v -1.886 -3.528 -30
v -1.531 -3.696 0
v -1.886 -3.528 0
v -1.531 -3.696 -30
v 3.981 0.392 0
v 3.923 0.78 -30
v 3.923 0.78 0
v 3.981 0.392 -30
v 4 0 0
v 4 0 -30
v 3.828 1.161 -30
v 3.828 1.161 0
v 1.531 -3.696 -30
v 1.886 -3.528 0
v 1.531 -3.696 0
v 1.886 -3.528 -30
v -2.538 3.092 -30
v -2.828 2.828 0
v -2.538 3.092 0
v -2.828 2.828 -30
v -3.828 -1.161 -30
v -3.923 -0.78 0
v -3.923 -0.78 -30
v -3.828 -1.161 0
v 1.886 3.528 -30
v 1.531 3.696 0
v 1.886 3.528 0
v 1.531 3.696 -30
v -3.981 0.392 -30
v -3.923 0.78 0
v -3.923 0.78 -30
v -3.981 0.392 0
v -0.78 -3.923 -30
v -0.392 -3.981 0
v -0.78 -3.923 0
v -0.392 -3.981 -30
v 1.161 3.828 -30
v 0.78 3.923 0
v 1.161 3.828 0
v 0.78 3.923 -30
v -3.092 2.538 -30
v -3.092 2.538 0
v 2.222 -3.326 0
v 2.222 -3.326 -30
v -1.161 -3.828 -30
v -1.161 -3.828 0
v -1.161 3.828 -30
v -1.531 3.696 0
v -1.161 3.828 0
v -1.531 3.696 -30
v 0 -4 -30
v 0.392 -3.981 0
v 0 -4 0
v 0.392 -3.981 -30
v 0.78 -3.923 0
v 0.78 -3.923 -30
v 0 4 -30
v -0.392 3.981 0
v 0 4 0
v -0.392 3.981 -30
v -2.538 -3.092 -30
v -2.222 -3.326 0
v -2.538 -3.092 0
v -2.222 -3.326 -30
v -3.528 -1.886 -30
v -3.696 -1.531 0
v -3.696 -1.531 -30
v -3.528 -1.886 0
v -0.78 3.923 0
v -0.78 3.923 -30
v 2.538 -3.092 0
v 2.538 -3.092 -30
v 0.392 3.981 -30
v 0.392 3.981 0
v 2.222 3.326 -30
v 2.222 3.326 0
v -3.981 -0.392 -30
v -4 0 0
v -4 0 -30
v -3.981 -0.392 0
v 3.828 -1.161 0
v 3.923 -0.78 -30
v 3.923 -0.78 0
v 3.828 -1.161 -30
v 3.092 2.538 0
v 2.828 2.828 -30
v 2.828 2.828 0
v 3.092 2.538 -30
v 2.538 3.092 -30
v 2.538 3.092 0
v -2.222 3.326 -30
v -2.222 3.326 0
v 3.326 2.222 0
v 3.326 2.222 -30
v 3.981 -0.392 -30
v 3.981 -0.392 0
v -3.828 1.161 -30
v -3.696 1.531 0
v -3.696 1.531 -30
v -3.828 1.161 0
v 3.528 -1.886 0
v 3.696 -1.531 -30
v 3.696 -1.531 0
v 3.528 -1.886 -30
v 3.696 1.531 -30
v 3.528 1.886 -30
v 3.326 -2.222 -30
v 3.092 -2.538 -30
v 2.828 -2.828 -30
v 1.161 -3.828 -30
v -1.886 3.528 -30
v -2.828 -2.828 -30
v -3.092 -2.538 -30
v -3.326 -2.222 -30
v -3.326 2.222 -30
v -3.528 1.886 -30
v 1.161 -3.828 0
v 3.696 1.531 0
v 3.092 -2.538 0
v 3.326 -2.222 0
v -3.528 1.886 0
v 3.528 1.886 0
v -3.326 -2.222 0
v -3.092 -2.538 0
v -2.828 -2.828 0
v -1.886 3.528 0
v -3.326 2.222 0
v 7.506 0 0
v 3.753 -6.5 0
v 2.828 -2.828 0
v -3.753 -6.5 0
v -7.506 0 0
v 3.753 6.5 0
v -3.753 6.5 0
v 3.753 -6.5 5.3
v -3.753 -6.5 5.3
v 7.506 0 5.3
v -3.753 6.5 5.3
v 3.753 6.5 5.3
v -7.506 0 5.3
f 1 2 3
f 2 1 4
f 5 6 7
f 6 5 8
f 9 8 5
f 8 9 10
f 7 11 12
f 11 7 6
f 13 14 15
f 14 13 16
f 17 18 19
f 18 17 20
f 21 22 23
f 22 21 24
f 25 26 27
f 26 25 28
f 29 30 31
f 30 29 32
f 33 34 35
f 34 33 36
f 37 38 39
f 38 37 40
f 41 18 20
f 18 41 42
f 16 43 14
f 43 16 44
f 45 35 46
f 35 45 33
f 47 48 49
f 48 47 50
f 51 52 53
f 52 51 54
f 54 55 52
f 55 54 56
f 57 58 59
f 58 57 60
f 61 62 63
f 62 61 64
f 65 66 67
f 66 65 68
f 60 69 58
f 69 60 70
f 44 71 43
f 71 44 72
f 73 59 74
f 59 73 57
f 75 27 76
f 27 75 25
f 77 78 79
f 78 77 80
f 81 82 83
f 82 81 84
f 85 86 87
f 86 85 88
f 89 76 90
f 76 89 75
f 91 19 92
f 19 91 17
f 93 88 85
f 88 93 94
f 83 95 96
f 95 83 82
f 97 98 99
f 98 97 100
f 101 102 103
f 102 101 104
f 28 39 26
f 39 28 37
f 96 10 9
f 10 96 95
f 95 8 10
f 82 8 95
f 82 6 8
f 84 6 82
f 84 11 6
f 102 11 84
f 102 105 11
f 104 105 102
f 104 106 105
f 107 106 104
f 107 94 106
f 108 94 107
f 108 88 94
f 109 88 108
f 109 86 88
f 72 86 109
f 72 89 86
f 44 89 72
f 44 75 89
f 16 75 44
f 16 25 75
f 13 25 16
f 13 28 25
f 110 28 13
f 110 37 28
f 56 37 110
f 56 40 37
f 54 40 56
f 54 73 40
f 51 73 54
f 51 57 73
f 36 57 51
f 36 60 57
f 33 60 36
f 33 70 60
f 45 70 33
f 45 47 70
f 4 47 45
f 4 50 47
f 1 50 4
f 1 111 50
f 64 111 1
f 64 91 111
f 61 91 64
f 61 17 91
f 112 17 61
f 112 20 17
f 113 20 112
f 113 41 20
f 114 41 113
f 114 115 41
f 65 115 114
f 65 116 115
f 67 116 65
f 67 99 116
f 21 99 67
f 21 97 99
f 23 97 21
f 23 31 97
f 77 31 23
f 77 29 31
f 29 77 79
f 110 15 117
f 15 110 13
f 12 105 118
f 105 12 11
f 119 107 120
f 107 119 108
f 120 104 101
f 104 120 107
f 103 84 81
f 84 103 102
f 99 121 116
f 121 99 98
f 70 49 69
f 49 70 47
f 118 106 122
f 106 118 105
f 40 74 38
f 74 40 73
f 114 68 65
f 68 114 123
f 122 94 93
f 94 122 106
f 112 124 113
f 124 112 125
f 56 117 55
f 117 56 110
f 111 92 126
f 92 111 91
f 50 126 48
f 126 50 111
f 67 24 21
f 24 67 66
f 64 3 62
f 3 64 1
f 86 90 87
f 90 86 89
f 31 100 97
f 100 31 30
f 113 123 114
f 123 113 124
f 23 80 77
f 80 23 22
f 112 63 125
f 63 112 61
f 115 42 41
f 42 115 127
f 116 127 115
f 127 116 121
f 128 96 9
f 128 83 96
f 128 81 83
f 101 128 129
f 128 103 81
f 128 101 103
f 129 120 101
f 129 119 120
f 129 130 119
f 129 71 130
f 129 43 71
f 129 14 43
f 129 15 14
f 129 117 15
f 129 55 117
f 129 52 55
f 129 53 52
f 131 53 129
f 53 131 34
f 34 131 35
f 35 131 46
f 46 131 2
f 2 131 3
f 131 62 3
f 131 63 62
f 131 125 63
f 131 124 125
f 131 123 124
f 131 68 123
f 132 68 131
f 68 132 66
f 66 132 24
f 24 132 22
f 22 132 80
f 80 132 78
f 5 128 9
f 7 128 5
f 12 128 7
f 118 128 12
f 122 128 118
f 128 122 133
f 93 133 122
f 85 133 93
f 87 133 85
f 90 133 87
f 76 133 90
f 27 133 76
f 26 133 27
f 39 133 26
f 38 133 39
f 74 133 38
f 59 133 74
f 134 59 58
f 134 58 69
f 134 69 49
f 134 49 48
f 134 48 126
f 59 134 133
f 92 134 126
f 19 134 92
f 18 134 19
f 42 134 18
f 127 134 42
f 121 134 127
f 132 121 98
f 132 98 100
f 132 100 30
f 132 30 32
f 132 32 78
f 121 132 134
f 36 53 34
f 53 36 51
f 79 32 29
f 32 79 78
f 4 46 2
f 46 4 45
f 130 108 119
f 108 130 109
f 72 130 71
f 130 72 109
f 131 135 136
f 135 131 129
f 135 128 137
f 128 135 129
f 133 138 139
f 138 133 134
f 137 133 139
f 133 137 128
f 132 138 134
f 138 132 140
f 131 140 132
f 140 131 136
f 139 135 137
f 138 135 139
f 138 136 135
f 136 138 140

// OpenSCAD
union() {
    translate([0, 0, -30])
        cylinder(h = 30, d = 8, $fn = 64);

    cylinder(h = 5.3, r = 13 / (2 * cos(30)), $fn = 6);
}
